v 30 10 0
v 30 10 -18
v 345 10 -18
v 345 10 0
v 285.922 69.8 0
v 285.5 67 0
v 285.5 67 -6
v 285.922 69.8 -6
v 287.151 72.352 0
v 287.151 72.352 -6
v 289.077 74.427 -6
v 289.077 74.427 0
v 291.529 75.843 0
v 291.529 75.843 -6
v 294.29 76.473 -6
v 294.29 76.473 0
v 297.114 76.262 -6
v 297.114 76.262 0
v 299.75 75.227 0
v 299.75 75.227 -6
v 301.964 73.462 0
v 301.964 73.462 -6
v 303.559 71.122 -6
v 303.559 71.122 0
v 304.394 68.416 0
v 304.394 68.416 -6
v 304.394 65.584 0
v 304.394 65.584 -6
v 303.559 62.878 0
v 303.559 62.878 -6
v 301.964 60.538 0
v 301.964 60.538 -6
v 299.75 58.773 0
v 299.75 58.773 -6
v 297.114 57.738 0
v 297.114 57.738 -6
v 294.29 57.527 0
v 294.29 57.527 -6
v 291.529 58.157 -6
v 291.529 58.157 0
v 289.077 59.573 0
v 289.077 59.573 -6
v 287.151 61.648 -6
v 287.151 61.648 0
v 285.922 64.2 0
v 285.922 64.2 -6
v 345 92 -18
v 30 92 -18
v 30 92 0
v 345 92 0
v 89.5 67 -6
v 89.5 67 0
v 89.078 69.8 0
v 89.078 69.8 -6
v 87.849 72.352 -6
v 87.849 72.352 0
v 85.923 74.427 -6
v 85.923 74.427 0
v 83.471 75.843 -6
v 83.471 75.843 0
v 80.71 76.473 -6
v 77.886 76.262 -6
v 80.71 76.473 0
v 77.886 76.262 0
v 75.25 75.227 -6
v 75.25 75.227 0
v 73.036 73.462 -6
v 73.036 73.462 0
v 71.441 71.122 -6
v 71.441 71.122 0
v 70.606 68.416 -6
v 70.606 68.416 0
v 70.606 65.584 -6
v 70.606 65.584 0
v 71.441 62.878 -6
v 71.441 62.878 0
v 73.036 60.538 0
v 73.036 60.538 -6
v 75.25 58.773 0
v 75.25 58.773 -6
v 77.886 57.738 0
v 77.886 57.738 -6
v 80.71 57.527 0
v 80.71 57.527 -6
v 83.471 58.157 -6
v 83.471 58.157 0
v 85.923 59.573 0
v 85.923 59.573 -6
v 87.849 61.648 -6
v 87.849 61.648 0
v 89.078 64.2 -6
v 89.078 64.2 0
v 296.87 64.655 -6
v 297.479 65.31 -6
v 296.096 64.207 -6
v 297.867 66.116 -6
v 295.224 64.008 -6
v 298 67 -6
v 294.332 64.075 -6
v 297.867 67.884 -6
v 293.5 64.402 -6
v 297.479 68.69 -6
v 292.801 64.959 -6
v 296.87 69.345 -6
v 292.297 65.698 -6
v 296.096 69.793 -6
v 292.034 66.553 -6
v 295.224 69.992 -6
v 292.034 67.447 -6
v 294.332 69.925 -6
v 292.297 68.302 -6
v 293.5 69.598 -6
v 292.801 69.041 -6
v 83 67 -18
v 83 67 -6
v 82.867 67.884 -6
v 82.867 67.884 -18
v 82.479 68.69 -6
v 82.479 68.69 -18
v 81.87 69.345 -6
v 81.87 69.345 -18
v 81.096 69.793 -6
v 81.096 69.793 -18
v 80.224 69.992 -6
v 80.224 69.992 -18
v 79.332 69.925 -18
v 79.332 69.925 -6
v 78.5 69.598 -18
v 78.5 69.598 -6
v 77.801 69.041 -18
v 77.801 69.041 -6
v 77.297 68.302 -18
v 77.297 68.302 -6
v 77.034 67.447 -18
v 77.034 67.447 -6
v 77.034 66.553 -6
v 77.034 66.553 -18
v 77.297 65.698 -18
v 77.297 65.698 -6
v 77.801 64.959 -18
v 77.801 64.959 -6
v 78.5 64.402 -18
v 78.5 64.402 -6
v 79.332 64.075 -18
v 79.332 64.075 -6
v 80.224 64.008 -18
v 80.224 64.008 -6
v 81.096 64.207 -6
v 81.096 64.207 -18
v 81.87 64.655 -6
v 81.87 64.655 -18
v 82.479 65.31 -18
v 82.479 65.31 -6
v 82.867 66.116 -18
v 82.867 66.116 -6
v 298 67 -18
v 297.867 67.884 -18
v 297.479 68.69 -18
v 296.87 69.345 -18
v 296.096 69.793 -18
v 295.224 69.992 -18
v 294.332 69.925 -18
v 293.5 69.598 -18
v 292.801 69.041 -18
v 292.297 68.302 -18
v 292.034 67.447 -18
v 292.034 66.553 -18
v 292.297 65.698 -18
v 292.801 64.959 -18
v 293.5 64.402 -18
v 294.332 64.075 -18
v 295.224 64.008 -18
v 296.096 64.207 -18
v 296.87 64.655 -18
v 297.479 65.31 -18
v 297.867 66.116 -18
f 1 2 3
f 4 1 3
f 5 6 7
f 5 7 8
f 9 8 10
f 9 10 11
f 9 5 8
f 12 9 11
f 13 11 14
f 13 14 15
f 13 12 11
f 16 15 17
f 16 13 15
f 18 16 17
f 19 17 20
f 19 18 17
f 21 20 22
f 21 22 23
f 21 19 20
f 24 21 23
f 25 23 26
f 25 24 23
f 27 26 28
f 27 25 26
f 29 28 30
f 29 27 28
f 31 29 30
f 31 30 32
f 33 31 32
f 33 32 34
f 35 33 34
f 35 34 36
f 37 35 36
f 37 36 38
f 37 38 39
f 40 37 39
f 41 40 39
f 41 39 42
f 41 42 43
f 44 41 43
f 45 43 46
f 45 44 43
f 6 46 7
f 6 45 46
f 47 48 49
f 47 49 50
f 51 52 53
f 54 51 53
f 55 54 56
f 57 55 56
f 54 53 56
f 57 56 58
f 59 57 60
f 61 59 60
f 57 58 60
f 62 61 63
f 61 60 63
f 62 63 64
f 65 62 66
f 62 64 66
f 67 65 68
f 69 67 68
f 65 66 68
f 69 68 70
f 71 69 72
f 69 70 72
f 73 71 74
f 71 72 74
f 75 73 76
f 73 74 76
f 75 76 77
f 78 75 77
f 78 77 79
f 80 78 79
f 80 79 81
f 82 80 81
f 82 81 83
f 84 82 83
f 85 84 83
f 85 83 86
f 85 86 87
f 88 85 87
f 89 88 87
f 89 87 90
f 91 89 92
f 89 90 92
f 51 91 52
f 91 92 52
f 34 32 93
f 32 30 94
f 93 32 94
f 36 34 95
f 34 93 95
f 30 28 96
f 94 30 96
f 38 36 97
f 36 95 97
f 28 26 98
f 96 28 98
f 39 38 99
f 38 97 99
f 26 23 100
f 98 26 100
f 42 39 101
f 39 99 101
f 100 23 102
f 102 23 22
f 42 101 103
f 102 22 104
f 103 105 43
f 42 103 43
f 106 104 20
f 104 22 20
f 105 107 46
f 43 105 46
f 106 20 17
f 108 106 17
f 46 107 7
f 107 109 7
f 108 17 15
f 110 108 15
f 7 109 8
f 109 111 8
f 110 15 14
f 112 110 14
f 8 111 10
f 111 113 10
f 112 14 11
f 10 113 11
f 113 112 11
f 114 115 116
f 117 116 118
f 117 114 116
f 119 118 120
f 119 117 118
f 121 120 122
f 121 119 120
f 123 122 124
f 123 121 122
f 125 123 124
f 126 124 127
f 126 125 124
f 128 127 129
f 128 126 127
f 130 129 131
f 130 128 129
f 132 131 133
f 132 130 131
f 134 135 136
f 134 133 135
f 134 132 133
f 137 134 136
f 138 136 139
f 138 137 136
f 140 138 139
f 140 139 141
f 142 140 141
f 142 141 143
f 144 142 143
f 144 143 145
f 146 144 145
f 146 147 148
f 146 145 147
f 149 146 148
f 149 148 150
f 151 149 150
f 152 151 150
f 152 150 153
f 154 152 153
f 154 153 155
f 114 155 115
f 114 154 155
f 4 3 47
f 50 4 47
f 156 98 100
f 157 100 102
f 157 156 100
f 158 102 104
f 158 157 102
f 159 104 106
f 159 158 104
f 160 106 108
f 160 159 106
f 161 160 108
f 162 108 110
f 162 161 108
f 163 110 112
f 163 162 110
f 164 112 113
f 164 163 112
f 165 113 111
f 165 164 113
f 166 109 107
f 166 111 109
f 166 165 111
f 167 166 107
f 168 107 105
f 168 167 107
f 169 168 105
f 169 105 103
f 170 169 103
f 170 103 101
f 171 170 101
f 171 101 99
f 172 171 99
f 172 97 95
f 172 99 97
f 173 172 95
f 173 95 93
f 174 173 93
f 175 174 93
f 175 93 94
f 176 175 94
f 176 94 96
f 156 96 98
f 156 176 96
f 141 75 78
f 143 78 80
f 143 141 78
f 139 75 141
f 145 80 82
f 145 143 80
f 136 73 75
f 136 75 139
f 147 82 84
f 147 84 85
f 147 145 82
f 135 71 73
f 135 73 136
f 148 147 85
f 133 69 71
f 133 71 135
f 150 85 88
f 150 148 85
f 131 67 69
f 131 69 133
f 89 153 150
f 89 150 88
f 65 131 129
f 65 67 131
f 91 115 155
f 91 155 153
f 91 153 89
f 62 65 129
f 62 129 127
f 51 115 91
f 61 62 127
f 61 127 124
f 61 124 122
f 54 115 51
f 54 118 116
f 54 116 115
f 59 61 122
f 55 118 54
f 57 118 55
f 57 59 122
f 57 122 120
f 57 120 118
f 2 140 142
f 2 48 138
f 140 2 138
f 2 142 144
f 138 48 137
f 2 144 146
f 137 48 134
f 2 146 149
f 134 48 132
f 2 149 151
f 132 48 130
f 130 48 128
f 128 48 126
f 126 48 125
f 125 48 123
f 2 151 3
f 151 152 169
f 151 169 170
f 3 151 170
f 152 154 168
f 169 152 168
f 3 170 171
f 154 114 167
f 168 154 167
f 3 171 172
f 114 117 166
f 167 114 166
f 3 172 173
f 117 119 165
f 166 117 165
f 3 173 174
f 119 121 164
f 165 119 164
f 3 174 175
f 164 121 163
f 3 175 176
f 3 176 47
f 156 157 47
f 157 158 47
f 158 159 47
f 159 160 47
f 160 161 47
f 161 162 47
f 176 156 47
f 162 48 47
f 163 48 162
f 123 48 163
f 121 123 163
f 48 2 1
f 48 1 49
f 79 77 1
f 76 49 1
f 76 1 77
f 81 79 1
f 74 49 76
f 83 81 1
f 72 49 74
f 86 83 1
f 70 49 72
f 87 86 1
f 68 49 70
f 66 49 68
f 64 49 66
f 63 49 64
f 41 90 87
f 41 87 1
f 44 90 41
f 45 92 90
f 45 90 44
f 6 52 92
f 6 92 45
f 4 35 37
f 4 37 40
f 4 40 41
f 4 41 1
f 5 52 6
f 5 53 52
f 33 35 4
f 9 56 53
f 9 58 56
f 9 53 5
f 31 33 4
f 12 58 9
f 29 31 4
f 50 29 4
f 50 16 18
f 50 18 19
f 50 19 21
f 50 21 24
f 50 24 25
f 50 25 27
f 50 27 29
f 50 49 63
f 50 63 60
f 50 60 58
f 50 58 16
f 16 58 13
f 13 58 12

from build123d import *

# Parameters (mm, degrees)
SKETCH002_W  = 315
SKETCH002_H  = 82
SKETCH002_R  = 3
PAD002_DEPTH = 18
SKETCH003_R  = 9.5
POCKET_DEPTH = 6


with BuildPart() as part:
    # Sketch002 → Pad002 (new body)
    with BuildSketch(Plane.XY):
        with Locations((0, 41)):
            Rectangle(SKETCH002_W, SKETCH002_H)
        with Locations((-107.5, 57)):
            Circle(SKETCH002_R, mode=Mode.SUBTRACT)
        with Locations((107.5, 57)):
            Circle(SKETCH002_R, mode=Mode.SUBTRACT)
    extrude(amount=PAD002_DEPTH)

    # Sketch003 (on Face8 of Pad002) → Pocket (cut)
    with BuildSketch(Plane.XY.offset(18)):
        with Locations((-107.5, 57)):
            Circle(SKETCH003_R)
    pocket = extrude(amount=-POCKET_DEPTH, mode=Mode.SUBTRACT)

    # Mirrored: Pocket across Sketch003 V_Axis
    add(pocket.mirror(Plane(origin=(0, 0, 18), x_dir=(0, 0, 1), z_dir=(1, 0, 0))), mode=Mode.SUBTRACT)


with BuildPart() as part_1:
    # Clone placement: moved
    add(part.part.moved(Location((187.5, 10, -18))))


solid = part_1.part
